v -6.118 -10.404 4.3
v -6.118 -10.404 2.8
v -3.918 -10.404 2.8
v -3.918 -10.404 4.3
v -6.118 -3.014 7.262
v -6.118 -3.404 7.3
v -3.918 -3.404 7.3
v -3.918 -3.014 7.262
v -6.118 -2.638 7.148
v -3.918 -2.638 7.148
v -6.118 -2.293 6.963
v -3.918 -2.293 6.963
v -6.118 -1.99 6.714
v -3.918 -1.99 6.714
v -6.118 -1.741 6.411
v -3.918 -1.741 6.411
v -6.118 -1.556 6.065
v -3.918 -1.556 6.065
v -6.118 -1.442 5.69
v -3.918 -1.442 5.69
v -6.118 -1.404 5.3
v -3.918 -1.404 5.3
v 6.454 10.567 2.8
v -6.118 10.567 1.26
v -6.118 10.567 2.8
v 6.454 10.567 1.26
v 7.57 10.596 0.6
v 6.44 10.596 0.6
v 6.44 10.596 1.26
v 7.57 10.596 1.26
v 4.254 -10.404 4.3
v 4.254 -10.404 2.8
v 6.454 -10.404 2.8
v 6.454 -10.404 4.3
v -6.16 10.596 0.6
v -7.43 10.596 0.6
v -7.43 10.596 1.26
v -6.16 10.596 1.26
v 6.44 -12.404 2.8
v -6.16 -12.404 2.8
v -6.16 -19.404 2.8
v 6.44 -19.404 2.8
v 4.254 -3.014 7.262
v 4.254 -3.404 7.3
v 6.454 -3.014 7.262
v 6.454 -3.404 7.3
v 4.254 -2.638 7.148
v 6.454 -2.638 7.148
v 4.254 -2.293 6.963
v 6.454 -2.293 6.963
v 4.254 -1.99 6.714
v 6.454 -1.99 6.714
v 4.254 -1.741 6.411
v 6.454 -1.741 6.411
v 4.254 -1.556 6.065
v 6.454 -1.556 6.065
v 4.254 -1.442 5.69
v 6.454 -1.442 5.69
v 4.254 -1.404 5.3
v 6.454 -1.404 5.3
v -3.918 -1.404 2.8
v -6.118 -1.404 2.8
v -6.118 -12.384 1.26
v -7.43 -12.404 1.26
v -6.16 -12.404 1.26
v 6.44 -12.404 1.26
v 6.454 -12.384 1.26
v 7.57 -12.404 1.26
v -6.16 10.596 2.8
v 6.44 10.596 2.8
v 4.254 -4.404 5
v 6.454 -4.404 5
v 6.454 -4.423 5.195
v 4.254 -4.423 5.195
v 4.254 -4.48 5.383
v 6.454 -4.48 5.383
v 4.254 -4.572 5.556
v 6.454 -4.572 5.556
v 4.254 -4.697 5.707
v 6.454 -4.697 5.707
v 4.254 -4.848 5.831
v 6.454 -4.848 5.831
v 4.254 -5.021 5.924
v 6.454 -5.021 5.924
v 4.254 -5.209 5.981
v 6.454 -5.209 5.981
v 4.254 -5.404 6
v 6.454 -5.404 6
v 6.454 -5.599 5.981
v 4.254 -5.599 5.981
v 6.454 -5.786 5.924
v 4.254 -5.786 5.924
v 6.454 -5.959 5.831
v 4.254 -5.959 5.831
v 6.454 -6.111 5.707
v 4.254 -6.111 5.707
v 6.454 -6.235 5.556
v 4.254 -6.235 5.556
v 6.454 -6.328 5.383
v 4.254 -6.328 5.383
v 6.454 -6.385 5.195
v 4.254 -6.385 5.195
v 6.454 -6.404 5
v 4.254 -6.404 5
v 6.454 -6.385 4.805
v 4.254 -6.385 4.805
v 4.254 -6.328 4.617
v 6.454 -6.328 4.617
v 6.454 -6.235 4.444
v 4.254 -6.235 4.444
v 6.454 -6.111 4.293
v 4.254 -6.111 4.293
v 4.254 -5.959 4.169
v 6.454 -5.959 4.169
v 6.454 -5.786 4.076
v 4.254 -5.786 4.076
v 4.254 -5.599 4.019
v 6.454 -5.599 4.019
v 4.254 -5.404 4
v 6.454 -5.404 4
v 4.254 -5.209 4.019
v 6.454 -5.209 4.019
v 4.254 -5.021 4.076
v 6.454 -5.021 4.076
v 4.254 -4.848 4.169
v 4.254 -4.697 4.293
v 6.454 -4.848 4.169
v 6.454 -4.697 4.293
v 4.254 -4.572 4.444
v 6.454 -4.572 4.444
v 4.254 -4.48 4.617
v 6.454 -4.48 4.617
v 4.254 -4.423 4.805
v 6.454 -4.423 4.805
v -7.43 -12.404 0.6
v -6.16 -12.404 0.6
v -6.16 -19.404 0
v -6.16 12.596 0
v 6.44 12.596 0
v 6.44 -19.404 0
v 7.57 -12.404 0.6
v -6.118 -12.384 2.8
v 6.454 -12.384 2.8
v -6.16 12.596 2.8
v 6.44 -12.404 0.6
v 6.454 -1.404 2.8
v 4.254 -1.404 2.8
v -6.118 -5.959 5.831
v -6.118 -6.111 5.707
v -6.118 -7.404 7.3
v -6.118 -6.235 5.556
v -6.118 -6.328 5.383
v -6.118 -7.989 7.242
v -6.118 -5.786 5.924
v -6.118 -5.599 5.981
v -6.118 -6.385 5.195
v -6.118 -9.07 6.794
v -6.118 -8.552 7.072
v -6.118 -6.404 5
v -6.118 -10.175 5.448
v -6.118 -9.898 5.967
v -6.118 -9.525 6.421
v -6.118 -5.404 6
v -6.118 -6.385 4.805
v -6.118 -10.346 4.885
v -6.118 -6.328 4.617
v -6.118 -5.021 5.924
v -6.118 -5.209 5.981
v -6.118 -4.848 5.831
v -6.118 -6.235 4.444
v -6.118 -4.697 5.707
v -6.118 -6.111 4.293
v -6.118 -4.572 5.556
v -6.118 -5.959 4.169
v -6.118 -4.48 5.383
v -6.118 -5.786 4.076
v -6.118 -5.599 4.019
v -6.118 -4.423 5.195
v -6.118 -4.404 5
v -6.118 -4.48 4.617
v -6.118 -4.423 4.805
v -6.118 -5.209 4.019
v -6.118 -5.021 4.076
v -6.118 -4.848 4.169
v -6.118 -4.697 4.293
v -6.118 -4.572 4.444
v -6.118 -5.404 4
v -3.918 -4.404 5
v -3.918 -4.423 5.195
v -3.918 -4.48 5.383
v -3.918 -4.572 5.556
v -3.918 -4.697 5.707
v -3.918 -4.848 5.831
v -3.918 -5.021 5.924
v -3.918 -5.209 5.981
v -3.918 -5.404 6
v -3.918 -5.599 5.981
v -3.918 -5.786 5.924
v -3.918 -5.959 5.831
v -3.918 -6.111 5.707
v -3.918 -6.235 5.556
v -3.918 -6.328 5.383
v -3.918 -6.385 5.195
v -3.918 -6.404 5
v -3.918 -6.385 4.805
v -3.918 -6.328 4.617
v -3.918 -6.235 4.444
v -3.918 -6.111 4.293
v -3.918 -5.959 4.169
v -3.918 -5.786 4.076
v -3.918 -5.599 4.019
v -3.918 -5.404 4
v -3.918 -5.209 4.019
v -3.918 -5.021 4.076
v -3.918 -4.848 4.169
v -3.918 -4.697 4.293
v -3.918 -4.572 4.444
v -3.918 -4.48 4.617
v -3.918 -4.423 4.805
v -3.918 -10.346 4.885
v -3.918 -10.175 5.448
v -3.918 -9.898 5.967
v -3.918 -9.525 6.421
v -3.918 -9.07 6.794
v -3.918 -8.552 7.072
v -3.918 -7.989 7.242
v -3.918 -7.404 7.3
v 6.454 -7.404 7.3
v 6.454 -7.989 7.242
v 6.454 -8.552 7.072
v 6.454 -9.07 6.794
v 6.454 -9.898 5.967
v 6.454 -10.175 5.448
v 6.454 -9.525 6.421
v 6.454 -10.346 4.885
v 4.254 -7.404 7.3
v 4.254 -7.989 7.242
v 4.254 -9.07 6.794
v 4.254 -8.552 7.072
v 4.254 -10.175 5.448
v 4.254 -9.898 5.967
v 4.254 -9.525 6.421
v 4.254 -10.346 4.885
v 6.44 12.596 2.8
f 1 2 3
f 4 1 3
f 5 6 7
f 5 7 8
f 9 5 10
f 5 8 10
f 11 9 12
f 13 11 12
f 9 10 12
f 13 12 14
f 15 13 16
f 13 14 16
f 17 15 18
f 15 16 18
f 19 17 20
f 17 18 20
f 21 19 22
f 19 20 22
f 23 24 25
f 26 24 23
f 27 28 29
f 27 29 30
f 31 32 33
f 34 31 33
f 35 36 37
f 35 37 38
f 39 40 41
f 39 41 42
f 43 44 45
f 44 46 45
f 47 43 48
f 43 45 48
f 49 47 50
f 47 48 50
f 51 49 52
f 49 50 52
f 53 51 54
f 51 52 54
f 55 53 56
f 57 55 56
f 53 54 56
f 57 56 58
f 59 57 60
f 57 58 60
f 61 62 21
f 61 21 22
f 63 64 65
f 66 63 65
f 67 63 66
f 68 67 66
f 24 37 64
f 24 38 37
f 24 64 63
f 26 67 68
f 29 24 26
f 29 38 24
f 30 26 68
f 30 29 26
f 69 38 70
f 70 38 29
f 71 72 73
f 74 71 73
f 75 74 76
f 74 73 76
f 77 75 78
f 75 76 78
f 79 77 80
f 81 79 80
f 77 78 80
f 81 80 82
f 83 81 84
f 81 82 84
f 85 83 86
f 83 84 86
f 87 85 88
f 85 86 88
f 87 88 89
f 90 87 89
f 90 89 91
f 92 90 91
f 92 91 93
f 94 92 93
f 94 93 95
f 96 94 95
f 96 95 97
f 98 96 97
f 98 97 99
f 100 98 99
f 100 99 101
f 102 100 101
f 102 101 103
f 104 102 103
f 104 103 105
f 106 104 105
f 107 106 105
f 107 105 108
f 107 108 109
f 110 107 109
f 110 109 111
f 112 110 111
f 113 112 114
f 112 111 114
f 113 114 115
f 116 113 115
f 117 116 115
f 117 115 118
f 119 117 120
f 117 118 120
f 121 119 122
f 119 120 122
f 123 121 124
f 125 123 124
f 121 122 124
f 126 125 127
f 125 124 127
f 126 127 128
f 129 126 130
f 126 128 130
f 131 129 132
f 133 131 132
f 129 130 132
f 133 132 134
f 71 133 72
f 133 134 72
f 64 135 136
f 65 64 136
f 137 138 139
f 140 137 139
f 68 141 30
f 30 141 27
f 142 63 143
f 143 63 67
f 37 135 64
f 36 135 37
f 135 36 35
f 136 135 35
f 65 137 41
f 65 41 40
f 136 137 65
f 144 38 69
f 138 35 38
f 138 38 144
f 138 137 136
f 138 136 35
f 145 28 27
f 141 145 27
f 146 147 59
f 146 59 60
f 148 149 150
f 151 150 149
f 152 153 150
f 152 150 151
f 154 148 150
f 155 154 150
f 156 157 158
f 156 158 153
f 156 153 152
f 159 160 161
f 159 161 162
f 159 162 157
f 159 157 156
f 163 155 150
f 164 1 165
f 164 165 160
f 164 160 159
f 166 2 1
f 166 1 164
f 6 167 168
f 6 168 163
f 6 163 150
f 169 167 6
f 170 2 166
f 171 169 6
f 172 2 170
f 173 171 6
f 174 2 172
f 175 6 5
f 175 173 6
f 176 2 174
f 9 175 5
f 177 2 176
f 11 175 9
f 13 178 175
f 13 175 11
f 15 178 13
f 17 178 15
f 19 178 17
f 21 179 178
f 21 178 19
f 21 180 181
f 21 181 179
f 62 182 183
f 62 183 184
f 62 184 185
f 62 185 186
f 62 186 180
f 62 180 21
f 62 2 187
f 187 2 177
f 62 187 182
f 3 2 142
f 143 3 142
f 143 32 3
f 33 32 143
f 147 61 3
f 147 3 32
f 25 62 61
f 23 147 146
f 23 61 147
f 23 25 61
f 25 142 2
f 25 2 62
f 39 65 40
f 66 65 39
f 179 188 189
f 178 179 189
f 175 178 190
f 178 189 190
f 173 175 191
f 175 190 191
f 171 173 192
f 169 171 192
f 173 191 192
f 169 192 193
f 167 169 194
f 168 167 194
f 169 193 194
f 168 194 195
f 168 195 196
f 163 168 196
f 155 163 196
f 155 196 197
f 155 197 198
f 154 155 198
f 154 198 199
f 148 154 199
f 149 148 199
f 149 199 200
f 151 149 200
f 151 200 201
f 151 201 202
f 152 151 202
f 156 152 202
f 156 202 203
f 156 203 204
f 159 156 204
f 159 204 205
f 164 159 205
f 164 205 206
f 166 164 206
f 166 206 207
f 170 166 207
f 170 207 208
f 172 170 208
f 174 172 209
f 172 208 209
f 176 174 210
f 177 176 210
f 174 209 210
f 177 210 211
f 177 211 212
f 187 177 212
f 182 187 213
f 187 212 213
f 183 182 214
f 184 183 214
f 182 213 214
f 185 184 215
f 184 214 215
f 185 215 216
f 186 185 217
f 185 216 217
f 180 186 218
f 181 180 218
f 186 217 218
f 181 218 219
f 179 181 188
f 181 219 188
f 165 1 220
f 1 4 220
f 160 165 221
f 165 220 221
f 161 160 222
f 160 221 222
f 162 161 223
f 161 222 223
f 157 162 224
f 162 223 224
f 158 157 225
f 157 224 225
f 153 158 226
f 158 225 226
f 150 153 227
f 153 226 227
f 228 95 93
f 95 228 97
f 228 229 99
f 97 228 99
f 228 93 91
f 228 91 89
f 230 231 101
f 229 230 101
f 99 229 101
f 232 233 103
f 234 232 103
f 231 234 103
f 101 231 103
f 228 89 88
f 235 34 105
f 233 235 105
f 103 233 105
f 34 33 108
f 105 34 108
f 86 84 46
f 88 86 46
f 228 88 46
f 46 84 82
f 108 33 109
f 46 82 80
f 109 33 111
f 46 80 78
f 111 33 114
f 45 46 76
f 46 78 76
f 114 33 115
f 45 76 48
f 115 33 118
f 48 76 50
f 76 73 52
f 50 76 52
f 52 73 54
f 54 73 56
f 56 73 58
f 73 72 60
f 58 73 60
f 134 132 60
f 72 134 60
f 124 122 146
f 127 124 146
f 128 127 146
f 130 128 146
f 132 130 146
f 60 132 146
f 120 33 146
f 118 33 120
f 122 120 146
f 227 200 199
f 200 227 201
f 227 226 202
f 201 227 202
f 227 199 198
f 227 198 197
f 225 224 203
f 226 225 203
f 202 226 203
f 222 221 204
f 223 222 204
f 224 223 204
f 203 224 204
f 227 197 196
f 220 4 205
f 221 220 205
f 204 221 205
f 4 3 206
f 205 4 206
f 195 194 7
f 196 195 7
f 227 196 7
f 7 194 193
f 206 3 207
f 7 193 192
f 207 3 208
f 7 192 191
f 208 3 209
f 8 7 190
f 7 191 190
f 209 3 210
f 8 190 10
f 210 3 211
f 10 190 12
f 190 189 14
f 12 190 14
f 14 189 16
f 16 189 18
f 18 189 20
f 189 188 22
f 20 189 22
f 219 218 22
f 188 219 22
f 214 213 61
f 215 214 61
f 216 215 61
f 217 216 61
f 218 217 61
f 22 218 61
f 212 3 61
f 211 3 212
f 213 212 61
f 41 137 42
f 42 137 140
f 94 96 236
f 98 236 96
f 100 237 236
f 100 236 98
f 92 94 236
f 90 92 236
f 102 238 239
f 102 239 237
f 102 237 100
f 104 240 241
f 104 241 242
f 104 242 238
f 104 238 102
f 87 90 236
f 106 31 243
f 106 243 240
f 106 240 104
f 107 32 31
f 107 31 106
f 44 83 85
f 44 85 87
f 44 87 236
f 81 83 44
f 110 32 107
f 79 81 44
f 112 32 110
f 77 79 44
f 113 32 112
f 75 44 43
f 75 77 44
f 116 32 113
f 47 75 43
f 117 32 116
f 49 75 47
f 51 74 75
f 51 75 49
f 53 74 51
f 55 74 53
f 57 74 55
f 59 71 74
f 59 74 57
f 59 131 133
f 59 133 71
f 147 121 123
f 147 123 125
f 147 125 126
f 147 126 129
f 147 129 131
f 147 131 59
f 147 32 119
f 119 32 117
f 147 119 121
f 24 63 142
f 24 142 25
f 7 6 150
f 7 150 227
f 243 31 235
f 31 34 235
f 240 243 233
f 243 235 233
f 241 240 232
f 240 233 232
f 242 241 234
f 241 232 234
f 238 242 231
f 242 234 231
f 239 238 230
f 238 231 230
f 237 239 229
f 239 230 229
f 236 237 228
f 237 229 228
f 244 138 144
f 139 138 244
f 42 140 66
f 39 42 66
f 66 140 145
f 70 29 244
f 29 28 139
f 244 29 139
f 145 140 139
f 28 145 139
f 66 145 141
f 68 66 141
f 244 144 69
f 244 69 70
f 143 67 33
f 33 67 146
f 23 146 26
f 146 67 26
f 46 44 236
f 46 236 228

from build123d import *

# Parameters (mm, degrees)
F0_W      = 12.6
F0_H      = 32
F1_DEPTH  = 0.6
F2_W      = 15
F2_H      = 23
F3_DEPTH  = 0.66
F4_W      = 12.6
F4_H      = 7
F5_DEPTH  = 2.2
F6_W      = 12.6
F6_H      = 2
F7_DEPTH  = 2.2
F9_W      = 12.572133
F9_H      = 22.951454
F10_DEPTH = 1.54
F11_W     = 2.2
F11_H     = 9
F12_DEPTH = 4.5
F13_R     = 1
F14_DEPTH = 16
F15_R     = 3
F16_R     = 2
F17_R     = 3
F18_R     = 2


with BuildPart() as f1:
    # F0 (on Top) → F1 (new body)
    with BuildSketch(Plane.XY):
        with Locations((0.140124, -3.403742)):
            Rectangle(F0_W, F0_H)
    extrude(amount=F1_DEPTH)

    # F2 (on face) → F3 (join)
    with BuildSketch(Plane.XY.offset(0.6)):
        with Locations((0.070062, -0.903742)):
            Rectangle(F2_W, F2_H)
    extrude(amount=F3_DEPTH)

    # F4 (on face) → F5 (join)
    with BuildSketch(Plane.XY.offset(0.6)):
        with Locations((0.140124, -15.903742)):
            Rectangle(F4_W, F4_H)
    extrude(amount=F5_DEPTH)

    # F6 (on face) → F7 (join)
    with BuildSketch(Plane.XY.offset(0.6)):
        with Locations((0.140124, 11.596258)):
            Rectangle(F6_W, F6_H)
    extrude(amount=F7_DEPTH)

    # F9 (on face) → F10 (join)
    with BuildSketch(Plane.XY.offset(1.26)):
        with Locations((0.168414, -0.908688)):
            Rectangle(F9_W, F9_H)
    extrude(amount=F10_DEPTH)

    # F11 (on face) → F12 (join)
    with BuildSketch(Plane.XY.offset(2.8)):
        with Locations((-5.017652, -5.903742)):
            Rectangle(F11_W, F11_H)
        with Locations((5.354481, -5.903742)):
            Rectangle(F11_W, F11_H)
    extrude(amount=F12_DEPTH)

    # F13 (on face) → F14 (cut)
    with BuildSketch(Plane.YZ.offset(6.454481)):
        with Locations((-5.403742, 5)):
            Circle(F13_R)
    extrude(amount=-F14_DEPTH, mode=Mode.SUBTRACT)

    # F15
    f15_edges = [f1.edges().sort_by_distance(p)[0] for p in [
        (-5.017652, -10.403742, 7.3),
    ]]
    fillet(f15_edges, radius=F15_R)

    # F16
    f16_edges = [f1.edges().sort_by_distance(p)[0] for p in [
        (-5.017652, -1.403742, 7.3),
    ]]
    fillet(f16_edges, radius=F16_R)

    # F17
    f17_edges = [f1.edges().sort_by_distance(p)[0] for p in [
        (5.354481, -10.403742, 7.3),
    ]]
    fillet(f17_edges, radius=F17_R)

    # F18
    f18_edges = [f1.edges().sort_by_distance(p)[0] for p in [
        (5.354481, -1.403742, 7.3),
    ]]
    fillet(f18_edges, radius=F18_R)


solid = f1.part
